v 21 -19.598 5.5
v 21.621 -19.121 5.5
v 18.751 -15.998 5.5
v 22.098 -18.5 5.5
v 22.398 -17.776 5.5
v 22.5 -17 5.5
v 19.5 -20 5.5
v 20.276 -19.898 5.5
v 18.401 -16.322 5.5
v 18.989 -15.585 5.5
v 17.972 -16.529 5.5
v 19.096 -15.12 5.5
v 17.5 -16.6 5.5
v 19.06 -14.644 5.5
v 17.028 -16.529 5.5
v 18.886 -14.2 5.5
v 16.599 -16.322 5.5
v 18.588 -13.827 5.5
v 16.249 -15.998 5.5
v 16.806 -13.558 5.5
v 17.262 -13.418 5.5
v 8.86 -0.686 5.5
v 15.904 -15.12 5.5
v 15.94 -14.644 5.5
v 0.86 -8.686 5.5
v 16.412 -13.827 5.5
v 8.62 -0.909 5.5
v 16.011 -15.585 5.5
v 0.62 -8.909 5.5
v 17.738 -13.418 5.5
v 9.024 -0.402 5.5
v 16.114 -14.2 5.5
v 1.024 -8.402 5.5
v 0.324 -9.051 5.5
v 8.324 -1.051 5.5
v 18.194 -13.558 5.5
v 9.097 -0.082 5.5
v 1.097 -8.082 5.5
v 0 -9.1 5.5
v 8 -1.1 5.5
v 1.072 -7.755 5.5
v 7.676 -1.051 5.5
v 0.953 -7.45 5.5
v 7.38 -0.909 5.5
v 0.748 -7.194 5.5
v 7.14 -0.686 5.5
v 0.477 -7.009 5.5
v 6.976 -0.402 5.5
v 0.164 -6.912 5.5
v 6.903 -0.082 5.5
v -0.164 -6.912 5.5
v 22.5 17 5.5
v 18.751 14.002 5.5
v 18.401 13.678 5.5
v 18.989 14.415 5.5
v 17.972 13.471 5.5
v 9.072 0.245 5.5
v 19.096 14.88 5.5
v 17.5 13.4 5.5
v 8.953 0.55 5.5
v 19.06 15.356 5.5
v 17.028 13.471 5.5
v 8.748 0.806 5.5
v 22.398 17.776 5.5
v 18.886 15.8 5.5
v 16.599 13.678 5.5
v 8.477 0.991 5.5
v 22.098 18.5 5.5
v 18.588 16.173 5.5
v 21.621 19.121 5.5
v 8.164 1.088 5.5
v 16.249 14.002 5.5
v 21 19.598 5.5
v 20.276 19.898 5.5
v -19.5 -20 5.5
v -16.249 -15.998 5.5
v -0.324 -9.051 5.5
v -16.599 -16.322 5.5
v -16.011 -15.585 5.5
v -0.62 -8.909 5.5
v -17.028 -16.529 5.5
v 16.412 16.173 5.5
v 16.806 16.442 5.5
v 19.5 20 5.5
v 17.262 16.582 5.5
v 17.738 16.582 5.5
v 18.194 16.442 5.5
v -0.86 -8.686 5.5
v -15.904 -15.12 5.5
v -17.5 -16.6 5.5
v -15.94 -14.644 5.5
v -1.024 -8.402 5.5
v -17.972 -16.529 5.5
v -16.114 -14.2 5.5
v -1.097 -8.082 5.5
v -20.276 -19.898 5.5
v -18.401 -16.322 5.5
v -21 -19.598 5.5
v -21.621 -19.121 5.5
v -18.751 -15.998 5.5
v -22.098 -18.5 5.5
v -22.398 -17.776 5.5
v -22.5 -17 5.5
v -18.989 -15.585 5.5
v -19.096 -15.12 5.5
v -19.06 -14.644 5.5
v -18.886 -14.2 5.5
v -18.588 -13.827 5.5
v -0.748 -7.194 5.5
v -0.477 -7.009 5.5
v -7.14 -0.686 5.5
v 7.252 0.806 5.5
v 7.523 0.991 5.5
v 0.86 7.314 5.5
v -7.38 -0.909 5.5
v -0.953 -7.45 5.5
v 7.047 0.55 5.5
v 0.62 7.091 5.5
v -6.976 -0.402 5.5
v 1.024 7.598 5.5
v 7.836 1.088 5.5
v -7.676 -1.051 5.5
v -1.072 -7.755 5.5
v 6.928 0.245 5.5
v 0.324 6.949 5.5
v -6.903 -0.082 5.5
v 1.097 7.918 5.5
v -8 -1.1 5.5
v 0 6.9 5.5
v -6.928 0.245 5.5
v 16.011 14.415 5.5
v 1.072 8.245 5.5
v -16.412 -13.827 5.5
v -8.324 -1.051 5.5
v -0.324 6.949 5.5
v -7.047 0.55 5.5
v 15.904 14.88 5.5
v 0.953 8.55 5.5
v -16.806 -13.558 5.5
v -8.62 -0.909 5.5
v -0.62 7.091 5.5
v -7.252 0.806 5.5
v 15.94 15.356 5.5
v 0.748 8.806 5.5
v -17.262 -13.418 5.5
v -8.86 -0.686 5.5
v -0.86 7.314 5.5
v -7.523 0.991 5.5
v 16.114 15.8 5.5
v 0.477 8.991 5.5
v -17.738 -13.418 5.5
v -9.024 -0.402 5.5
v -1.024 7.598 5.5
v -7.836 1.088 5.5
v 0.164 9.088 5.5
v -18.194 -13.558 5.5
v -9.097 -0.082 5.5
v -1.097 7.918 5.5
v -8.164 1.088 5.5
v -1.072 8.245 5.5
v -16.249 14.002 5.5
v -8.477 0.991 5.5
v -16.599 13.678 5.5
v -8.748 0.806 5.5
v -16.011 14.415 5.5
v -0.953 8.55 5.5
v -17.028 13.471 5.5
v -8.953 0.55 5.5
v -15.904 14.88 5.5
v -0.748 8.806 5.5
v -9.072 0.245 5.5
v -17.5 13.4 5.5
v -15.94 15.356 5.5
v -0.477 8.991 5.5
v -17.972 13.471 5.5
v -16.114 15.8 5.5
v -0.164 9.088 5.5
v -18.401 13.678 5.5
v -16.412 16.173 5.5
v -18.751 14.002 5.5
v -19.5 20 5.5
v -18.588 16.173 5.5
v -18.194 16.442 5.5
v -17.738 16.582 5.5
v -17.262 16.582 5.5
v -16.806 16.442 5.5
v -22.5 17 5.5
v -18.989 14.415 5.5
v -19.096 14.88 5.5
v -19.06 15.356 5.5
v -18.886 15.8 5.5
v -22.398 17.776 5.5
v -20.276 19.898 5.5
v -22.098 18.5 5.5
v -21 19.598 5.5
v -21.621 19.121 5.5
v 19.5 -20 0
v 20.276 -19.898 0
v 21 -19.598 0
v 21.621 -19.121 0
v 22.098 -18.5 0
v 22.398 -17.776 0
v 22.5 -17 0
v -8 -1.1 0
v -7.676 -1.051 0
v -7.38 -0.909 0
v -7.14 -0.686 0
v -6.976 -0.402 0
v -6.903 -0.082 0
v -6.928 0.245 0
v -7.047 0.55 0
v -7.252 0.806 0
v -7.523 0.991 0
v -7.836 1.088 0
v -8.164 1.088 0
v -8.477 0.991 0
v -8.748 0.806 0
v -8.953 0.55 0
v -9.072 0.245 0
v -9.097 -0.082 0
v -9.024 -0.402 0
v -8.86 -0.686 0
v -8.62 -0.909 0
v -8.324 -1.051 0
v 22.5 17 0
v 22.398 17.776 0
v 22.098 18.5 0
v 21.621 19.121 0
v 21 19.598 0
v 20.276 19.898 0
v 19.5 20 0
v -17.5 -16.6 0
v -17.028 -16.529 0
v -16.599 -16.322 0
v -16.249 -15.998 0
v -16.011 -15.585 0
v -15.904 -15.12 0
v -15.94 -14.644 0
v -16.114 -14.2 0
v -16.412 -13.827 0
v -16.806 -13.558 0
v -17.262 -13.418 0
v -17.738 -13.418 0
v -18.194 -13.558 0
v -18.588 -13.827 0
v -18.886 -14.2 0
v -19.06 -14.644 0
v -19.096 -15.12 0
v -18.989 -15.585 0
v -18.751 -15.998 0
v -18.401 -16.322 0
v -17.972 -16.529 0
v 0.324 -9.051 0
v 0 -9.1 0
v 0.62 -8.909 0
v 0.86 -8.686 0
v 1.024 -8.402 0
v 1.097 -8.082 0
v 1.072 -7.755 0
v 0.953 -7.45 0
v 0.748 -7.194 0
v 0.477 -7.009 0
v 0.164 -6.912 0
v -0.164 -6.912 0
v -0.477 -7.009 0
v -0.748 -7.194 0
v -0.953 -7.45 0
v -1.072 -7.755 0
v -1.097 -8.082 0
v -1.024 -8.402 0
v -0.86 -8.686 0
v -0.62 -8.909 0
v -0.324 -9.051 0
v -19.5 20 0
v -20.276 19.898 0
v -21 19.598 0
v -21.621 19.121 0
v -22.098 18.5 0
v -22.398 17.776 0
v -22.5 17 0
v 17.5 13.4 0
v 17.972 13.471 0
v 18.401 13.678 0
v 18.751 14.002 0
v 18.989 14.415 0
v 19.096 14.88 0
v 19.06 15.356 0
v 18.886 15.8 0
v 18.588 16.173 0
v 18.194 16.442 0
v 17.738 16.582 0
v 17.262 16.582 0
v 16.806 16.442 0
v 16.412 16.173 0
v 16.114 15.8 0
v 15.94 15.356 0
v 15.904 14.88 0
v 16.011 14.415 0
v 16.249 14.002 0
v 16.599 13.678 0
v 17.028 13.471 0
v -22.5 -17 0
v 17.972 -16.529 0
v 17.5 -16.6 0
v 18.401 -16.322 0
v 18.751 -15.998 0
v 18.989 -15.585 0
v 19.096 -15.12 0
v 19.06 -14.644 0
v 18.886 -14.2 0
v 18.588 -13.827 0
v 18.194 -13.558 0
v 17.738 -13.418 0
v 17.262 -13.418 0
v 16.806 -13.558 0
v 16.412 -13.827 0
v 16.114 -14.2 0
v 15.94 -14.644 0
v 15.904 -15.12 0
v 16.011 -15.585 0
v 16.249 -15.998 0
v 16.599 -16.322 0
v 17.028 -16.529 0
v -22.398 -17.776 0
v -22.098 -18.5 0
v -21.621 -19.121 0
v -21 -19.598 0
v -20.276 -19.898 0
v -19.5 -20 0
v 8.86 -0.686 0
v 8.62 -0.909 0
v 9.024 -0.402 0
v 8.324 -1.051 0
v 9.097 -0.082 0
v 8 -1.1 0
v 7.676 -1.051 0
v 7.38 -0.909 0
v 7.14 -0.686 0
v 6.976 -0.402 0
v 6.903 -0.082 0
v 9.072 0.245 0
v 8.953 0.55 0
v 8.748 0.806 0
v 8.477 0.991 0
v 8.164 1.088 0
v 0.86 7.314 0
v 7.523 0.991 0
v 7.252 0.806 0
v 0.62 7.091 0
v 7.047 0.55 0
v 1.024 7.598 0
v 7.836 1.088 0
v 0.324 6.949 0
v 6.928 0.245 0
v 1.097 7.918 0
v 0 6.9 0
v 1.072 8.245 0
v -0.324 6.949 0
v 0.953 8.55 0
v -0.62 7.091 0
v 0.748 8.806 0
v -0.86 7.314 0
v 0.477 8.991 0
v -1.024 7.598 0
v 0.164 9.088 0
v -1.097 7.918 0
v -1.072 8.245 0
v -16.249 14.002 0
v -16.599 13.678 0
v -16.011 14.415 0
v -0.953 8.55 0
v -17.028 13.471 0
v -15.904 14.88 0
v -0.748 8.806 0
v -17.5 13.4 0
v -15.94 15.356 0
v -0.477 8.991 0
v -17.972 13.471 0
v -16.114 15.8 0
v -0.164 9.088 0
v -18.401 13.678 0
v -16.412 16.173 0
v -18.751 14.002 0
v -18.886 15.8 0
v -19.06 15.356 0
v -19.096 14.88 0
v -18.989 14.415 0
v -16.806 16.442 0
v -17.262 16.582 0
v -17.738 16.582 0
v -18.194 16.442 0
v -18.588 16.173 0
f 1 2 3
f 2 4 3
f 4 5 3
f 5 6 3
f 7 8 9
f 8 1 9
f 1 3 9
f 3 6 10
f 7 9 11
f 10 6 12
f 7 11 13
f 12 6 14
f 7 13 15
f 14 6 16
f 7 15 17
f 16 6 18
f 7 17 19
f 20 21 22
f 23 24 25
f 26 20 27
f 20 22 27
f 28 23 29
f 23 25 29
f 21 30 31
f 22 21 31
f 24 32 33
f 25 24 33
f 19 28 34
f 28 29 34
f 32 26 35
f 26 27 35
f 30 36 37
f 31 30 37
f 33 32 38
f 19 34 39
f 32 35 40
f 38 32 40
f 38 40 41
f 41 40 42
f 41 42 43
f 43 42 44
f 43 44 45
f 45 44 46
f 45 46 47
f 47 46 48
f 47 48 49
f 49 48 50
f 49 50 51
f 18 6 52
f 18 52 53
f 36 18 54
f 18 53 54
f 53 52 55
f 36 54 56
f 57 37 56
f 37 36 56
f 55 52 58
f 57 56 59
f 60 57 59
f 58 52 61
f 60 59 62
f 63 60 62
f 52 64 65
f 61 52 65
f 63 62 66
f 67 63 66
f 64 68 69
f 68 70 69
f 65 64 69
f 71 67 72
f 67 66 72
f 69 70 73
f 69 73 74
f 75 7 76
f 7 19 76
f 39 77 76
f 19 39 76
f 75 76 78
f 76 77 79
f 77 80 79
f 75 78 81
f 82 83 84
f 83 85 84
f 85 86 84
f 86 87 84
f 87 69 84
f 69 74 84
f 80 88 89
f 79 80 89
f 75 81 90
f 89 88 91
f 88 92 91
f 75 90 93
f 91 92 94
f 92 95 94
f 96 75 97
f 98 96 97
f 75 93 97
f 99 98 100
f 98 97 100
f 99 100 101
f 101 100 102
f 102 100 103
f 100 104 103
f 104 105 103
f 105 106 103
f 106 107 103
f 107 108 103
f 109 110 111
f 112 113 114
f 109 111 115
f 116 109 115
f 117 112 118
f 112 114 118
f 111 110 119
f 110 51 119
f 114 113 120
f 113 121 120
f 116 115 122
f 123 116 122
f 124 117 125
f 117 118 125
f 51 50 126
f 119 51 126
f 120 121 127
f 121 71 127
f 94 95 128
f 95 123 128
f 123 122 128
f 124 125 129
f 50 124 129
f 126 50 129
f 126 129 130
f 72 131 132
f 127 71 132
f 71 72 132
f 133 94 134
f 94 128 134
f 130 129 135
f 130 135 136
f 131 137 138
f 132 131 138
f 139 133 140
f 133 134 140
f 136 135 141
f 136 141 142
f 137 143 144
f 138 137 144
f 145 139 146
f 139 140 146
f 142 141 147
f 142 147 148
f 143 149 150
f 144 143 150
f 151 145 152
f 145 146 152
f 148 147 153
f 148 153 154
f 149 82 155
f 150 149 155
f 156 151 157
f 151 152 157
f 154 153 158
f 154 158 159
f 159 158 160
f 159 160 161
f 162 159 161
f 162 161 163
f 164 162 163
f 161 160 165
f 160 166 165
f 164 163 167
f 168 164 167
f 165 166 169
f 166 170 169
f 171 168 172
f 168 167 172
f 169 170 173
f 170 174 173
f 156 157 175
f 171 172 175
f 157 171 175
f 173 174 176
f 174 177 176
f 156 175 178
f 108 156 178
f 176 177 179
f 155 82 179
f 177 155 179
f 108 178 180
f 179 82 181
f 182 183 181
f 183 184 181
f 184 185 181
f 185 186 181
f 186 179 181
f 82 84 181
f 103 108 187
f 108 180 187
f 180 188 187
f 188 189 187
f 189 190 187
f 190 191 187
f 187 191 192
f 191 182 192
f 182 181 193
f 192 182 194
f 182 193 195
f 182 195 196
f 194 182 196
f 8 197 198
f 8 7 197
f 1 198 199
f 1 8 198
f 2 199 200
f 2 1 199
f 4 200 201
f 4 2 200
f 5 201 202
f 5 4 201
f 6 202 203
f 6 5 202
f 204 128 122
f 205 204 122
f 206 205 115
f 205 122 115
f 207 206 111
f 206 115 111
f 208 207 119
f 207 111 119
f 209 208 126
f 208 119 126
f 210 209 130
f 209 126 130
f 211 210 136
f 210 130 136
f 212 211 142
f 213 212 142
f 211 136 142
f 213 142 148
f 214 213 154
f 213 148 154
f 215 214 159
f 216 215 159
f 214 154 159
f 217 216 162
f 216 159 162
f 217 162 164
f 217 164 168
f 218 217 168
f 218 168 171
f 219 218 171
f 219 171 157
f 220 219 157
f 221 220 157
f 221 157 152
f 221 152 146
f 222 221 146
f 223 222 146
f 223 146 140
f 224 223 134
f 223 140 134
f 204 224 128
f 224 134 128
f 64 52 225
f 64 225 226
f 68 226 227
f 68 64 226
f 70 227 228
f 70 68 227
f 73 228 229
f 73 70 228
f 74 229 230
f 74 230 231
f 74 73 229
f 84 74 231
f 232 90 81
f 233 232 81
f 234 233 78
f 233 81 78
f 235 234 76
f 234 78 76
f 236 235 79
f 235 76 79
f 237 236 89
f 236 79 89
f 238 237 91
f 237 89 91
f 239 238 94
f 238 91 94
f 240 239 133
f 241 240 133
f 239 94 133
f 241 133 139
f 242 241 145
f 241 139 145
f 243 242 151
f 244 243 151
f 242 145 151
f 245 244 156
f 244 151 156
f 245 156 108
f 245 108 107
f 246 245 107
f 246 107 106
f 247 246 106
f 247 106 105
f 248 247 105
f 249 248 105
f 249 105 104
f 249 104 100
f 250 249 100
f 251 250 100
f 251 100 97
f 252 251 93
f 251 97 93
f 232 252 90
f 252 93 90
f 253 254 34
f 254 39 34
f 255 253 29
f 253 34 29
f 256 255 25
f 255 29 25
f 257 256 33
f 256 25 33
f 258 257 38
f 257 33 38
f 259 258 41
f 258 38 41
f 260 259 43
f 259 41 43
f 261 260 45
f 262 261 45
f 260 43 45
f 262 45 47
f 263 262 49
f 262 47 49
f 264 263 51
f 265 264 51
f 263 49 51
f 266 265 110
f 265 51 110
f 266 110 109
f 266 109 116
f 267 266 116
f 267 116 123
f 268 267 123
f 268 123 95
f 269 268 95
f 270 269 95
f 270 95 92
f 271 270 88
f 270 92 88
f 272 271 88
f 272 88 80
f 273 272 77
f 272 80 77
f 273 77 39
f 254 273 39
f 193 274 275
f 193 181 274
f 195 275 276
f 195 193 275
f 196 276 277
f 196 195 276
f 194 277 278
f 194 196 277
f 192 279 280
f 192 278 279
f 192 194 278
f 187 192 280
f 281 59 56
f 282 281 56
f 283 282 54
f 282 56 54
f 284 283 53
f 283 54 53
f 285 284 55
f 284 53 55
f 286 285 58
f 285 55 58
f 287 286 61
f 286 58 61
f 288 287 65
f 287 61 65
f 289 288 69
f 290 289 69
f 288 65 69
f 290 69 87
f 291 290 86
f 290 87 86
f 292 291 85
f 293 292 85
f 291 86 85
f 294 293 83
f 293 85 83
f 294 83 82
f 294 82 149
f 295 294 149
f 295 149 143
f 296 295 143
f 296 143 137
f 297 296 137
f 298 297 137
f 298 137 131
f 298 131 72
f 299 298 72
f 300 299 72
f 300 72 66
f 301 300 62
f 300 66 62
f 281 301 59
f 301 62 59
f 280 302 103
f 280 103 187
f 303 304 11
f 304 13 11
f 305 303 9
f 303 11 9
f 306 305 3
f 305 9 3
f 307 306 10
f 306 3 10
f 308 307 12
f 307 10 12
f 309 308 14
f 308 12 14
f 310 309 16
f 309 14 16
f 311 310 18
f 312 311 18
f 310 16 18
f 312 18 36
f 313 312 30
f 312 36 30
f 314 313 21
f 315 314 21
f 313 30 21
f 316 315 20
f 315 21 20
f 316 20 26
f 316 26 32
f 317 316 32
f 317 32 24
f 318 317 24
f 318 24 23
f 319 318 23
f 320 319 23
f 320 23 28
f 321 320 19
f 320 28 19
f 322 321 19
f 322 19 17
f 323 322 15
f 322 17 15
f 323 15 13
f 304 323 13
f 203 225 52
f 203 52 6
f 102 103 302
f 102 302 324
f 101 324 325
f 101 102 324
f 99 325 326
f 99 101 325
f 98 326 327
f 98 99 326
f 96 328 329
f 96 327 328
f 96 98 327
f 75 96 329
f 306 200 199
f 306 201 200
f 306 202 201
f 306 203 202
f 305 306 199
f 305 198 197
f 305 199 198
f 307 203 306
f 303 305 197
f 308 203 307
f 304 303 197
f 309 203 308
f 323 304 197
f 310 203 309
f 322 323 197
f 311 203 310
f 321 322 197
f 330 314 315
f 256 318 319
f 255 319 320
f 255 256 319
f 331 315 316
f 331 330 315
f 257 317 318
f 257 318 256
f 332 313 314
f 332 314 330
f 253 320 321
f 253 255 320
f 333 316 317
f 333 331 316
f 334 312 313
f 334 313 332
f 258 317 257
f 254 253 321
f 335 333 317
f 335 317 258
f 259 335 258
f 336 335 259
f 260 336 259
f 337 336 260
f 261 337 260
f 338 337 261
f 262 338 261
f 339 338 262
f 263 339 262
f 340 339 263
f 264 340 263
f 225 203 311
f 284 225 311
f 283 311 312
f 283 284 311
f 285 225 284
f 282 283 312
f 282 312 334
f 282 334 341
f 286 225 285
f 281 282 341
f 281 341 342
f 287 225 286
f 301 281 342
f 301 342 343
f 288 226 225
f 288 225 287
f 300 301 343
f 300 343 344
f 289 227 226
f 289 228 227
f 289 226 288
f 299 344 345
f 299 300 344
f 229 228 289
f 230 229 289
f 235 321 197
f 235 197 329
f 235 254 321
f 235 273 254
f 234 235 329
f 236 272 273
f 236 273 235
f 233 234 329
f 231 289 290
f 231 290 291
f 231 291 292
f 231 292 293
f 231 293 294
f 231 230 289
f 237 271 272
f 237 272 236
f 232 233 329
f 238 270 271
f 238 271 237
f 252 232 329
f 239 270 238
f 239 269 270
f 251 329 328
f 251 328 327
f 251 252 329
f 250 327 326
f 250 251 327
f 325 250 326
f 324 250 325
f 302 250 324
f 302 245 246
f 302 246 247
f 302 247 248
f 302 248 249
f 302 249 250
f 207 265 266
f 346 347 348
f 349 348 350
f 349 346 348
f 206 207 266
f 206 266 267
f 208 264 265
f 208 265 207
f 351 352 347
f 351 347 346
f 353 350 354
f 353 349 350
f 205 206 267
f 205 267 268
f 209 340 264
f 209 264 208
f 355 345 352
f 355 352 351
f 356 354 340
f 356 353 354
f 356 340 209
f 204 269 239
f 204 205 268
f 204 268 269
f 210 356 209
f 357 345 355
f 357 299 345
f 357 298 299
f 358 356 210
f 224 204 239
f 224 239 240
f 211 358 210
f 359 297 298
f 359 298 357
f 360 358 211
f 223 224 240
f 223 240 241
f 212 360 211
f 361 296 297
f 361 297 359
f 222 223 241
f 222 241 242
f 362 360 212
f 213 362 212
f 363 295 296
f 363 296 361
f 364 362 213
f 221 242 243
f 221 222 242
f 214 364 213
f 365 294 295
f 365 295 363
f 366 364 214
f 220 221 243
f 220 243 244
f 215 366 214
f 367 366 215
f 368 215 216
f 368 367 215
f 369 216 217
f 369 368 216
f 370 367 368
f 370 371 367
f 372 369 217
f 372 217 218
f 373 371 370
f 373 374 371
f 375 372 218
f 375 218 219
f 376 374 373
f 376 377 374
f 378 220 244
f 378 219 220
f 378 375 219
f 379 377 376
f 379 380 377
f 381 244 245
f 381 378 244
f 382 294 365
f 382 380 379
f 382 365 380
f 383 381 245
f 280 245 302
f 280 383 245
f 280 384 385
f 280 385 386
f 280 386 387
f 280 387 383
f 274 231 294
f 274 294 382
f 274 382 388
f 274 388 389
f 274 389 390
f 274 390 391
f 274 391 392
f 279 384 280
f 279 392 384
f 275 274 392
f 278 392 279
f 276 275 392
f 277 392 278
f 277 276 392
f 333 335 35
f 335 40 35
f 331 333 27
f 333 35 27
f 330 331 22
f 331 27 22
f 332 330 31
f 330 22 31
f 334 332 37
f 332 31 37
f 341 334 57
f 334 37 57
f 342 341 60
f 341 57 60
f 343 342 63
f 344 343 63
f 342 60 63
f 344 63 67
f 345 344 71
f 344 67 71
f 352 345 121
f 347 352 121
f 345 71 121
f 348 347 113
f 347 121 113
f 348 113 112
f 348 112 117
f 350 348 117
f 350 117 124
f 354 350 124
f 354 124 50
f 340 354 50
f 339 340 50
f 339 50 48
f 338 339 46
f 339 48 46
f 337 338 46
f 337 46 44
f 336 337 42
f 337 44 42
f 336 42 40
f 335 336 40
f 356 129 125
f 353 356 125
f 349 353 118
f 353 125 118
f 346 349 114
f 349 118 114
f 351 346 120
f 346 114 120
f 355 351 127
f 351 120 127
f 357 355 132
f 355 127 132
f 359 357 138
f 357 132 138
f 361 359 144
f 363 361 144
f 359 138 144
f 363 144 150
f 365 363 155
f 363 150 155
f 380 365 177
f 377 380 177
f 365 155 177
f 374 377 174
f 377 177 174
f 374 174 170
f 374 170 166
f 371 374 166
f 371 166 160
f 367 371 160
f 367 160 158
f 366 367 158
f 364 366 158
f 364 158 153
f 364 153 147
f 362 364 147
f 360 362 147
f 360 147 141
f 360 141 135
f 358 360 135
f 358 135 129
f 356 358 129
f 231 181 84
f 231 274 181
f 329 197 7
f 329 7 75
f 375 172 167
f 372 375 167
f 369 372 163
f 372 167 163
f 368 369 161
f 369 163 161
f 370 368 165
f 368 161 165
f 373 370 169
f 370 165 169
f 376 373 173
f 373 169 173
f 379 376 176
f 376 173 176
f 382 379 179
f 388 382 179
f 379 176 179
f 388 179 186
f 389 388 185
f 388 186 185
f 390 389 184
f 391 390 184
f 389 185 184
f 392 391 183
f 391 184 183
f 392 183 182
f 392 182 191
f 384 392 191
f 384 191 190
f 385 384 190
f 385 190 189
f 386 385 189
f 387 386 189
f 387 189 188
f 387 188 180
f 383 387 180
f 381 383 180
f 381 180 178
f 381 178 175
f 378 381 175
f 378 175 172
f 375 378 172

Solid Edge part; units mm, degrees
sketch "Sketch1" plane through (0, 0, 0) normal (0, 0, 1) x (1, 0, 0)
  line L0 (22.5, -20) -> (-22.5, -20)
  line L1 (-22.5, -20) -> (-22.5, 20)
  line L2 (-22.5, 20) -> (22.5, 20)
  line L3 (22.5, 20) -> (22.5, -20)
  dimension "D1" = 40
  dimension "D2" = 45
extrude "Protrusion1" add sketch "Sketch1" along normal blind 5.5
hole "Hole_1" at (0, -8, 5.5) direction (0, 0, -1) diameter 2.2 end up to next
hole "Hole1" at (8, 0, 5.5) direction (0, 0, -1) diameter 2.2 end up to next
hole "Hole2" at (-8, 0, 5.5) direction (0, 0, -1) diameter 2.2 end up to next
hole "Hole3" at (0, 8, 5.5) direction (0, 0, -1) diameter 2.2 end up to next
hole "Hole_5" at (-17.5, 15, 5.5) direction (0, 0, -1) diameter 3.2 end up to next
hole "Hole4" at (17.5, 15, 5.5) direction (0, 0, -1) diameter 3.2 end up to next
hole "Hole5" at (17.5, -15, 5.5) direction (0, 0, -1) diameter 3.2 end up to next
hole "Hole6" at (-17.5, -15, 5.5) direction (0, 0, -1) diameter 3.2 end up to next
fillet "Round_1" radius 3 4 edges at (22.5, -20, 2.75) (22.5, 20, 2.75) (-22.5, -20, 2.75) (-22.5, 20, 2.75)
properties material "木材, アッシュ"
